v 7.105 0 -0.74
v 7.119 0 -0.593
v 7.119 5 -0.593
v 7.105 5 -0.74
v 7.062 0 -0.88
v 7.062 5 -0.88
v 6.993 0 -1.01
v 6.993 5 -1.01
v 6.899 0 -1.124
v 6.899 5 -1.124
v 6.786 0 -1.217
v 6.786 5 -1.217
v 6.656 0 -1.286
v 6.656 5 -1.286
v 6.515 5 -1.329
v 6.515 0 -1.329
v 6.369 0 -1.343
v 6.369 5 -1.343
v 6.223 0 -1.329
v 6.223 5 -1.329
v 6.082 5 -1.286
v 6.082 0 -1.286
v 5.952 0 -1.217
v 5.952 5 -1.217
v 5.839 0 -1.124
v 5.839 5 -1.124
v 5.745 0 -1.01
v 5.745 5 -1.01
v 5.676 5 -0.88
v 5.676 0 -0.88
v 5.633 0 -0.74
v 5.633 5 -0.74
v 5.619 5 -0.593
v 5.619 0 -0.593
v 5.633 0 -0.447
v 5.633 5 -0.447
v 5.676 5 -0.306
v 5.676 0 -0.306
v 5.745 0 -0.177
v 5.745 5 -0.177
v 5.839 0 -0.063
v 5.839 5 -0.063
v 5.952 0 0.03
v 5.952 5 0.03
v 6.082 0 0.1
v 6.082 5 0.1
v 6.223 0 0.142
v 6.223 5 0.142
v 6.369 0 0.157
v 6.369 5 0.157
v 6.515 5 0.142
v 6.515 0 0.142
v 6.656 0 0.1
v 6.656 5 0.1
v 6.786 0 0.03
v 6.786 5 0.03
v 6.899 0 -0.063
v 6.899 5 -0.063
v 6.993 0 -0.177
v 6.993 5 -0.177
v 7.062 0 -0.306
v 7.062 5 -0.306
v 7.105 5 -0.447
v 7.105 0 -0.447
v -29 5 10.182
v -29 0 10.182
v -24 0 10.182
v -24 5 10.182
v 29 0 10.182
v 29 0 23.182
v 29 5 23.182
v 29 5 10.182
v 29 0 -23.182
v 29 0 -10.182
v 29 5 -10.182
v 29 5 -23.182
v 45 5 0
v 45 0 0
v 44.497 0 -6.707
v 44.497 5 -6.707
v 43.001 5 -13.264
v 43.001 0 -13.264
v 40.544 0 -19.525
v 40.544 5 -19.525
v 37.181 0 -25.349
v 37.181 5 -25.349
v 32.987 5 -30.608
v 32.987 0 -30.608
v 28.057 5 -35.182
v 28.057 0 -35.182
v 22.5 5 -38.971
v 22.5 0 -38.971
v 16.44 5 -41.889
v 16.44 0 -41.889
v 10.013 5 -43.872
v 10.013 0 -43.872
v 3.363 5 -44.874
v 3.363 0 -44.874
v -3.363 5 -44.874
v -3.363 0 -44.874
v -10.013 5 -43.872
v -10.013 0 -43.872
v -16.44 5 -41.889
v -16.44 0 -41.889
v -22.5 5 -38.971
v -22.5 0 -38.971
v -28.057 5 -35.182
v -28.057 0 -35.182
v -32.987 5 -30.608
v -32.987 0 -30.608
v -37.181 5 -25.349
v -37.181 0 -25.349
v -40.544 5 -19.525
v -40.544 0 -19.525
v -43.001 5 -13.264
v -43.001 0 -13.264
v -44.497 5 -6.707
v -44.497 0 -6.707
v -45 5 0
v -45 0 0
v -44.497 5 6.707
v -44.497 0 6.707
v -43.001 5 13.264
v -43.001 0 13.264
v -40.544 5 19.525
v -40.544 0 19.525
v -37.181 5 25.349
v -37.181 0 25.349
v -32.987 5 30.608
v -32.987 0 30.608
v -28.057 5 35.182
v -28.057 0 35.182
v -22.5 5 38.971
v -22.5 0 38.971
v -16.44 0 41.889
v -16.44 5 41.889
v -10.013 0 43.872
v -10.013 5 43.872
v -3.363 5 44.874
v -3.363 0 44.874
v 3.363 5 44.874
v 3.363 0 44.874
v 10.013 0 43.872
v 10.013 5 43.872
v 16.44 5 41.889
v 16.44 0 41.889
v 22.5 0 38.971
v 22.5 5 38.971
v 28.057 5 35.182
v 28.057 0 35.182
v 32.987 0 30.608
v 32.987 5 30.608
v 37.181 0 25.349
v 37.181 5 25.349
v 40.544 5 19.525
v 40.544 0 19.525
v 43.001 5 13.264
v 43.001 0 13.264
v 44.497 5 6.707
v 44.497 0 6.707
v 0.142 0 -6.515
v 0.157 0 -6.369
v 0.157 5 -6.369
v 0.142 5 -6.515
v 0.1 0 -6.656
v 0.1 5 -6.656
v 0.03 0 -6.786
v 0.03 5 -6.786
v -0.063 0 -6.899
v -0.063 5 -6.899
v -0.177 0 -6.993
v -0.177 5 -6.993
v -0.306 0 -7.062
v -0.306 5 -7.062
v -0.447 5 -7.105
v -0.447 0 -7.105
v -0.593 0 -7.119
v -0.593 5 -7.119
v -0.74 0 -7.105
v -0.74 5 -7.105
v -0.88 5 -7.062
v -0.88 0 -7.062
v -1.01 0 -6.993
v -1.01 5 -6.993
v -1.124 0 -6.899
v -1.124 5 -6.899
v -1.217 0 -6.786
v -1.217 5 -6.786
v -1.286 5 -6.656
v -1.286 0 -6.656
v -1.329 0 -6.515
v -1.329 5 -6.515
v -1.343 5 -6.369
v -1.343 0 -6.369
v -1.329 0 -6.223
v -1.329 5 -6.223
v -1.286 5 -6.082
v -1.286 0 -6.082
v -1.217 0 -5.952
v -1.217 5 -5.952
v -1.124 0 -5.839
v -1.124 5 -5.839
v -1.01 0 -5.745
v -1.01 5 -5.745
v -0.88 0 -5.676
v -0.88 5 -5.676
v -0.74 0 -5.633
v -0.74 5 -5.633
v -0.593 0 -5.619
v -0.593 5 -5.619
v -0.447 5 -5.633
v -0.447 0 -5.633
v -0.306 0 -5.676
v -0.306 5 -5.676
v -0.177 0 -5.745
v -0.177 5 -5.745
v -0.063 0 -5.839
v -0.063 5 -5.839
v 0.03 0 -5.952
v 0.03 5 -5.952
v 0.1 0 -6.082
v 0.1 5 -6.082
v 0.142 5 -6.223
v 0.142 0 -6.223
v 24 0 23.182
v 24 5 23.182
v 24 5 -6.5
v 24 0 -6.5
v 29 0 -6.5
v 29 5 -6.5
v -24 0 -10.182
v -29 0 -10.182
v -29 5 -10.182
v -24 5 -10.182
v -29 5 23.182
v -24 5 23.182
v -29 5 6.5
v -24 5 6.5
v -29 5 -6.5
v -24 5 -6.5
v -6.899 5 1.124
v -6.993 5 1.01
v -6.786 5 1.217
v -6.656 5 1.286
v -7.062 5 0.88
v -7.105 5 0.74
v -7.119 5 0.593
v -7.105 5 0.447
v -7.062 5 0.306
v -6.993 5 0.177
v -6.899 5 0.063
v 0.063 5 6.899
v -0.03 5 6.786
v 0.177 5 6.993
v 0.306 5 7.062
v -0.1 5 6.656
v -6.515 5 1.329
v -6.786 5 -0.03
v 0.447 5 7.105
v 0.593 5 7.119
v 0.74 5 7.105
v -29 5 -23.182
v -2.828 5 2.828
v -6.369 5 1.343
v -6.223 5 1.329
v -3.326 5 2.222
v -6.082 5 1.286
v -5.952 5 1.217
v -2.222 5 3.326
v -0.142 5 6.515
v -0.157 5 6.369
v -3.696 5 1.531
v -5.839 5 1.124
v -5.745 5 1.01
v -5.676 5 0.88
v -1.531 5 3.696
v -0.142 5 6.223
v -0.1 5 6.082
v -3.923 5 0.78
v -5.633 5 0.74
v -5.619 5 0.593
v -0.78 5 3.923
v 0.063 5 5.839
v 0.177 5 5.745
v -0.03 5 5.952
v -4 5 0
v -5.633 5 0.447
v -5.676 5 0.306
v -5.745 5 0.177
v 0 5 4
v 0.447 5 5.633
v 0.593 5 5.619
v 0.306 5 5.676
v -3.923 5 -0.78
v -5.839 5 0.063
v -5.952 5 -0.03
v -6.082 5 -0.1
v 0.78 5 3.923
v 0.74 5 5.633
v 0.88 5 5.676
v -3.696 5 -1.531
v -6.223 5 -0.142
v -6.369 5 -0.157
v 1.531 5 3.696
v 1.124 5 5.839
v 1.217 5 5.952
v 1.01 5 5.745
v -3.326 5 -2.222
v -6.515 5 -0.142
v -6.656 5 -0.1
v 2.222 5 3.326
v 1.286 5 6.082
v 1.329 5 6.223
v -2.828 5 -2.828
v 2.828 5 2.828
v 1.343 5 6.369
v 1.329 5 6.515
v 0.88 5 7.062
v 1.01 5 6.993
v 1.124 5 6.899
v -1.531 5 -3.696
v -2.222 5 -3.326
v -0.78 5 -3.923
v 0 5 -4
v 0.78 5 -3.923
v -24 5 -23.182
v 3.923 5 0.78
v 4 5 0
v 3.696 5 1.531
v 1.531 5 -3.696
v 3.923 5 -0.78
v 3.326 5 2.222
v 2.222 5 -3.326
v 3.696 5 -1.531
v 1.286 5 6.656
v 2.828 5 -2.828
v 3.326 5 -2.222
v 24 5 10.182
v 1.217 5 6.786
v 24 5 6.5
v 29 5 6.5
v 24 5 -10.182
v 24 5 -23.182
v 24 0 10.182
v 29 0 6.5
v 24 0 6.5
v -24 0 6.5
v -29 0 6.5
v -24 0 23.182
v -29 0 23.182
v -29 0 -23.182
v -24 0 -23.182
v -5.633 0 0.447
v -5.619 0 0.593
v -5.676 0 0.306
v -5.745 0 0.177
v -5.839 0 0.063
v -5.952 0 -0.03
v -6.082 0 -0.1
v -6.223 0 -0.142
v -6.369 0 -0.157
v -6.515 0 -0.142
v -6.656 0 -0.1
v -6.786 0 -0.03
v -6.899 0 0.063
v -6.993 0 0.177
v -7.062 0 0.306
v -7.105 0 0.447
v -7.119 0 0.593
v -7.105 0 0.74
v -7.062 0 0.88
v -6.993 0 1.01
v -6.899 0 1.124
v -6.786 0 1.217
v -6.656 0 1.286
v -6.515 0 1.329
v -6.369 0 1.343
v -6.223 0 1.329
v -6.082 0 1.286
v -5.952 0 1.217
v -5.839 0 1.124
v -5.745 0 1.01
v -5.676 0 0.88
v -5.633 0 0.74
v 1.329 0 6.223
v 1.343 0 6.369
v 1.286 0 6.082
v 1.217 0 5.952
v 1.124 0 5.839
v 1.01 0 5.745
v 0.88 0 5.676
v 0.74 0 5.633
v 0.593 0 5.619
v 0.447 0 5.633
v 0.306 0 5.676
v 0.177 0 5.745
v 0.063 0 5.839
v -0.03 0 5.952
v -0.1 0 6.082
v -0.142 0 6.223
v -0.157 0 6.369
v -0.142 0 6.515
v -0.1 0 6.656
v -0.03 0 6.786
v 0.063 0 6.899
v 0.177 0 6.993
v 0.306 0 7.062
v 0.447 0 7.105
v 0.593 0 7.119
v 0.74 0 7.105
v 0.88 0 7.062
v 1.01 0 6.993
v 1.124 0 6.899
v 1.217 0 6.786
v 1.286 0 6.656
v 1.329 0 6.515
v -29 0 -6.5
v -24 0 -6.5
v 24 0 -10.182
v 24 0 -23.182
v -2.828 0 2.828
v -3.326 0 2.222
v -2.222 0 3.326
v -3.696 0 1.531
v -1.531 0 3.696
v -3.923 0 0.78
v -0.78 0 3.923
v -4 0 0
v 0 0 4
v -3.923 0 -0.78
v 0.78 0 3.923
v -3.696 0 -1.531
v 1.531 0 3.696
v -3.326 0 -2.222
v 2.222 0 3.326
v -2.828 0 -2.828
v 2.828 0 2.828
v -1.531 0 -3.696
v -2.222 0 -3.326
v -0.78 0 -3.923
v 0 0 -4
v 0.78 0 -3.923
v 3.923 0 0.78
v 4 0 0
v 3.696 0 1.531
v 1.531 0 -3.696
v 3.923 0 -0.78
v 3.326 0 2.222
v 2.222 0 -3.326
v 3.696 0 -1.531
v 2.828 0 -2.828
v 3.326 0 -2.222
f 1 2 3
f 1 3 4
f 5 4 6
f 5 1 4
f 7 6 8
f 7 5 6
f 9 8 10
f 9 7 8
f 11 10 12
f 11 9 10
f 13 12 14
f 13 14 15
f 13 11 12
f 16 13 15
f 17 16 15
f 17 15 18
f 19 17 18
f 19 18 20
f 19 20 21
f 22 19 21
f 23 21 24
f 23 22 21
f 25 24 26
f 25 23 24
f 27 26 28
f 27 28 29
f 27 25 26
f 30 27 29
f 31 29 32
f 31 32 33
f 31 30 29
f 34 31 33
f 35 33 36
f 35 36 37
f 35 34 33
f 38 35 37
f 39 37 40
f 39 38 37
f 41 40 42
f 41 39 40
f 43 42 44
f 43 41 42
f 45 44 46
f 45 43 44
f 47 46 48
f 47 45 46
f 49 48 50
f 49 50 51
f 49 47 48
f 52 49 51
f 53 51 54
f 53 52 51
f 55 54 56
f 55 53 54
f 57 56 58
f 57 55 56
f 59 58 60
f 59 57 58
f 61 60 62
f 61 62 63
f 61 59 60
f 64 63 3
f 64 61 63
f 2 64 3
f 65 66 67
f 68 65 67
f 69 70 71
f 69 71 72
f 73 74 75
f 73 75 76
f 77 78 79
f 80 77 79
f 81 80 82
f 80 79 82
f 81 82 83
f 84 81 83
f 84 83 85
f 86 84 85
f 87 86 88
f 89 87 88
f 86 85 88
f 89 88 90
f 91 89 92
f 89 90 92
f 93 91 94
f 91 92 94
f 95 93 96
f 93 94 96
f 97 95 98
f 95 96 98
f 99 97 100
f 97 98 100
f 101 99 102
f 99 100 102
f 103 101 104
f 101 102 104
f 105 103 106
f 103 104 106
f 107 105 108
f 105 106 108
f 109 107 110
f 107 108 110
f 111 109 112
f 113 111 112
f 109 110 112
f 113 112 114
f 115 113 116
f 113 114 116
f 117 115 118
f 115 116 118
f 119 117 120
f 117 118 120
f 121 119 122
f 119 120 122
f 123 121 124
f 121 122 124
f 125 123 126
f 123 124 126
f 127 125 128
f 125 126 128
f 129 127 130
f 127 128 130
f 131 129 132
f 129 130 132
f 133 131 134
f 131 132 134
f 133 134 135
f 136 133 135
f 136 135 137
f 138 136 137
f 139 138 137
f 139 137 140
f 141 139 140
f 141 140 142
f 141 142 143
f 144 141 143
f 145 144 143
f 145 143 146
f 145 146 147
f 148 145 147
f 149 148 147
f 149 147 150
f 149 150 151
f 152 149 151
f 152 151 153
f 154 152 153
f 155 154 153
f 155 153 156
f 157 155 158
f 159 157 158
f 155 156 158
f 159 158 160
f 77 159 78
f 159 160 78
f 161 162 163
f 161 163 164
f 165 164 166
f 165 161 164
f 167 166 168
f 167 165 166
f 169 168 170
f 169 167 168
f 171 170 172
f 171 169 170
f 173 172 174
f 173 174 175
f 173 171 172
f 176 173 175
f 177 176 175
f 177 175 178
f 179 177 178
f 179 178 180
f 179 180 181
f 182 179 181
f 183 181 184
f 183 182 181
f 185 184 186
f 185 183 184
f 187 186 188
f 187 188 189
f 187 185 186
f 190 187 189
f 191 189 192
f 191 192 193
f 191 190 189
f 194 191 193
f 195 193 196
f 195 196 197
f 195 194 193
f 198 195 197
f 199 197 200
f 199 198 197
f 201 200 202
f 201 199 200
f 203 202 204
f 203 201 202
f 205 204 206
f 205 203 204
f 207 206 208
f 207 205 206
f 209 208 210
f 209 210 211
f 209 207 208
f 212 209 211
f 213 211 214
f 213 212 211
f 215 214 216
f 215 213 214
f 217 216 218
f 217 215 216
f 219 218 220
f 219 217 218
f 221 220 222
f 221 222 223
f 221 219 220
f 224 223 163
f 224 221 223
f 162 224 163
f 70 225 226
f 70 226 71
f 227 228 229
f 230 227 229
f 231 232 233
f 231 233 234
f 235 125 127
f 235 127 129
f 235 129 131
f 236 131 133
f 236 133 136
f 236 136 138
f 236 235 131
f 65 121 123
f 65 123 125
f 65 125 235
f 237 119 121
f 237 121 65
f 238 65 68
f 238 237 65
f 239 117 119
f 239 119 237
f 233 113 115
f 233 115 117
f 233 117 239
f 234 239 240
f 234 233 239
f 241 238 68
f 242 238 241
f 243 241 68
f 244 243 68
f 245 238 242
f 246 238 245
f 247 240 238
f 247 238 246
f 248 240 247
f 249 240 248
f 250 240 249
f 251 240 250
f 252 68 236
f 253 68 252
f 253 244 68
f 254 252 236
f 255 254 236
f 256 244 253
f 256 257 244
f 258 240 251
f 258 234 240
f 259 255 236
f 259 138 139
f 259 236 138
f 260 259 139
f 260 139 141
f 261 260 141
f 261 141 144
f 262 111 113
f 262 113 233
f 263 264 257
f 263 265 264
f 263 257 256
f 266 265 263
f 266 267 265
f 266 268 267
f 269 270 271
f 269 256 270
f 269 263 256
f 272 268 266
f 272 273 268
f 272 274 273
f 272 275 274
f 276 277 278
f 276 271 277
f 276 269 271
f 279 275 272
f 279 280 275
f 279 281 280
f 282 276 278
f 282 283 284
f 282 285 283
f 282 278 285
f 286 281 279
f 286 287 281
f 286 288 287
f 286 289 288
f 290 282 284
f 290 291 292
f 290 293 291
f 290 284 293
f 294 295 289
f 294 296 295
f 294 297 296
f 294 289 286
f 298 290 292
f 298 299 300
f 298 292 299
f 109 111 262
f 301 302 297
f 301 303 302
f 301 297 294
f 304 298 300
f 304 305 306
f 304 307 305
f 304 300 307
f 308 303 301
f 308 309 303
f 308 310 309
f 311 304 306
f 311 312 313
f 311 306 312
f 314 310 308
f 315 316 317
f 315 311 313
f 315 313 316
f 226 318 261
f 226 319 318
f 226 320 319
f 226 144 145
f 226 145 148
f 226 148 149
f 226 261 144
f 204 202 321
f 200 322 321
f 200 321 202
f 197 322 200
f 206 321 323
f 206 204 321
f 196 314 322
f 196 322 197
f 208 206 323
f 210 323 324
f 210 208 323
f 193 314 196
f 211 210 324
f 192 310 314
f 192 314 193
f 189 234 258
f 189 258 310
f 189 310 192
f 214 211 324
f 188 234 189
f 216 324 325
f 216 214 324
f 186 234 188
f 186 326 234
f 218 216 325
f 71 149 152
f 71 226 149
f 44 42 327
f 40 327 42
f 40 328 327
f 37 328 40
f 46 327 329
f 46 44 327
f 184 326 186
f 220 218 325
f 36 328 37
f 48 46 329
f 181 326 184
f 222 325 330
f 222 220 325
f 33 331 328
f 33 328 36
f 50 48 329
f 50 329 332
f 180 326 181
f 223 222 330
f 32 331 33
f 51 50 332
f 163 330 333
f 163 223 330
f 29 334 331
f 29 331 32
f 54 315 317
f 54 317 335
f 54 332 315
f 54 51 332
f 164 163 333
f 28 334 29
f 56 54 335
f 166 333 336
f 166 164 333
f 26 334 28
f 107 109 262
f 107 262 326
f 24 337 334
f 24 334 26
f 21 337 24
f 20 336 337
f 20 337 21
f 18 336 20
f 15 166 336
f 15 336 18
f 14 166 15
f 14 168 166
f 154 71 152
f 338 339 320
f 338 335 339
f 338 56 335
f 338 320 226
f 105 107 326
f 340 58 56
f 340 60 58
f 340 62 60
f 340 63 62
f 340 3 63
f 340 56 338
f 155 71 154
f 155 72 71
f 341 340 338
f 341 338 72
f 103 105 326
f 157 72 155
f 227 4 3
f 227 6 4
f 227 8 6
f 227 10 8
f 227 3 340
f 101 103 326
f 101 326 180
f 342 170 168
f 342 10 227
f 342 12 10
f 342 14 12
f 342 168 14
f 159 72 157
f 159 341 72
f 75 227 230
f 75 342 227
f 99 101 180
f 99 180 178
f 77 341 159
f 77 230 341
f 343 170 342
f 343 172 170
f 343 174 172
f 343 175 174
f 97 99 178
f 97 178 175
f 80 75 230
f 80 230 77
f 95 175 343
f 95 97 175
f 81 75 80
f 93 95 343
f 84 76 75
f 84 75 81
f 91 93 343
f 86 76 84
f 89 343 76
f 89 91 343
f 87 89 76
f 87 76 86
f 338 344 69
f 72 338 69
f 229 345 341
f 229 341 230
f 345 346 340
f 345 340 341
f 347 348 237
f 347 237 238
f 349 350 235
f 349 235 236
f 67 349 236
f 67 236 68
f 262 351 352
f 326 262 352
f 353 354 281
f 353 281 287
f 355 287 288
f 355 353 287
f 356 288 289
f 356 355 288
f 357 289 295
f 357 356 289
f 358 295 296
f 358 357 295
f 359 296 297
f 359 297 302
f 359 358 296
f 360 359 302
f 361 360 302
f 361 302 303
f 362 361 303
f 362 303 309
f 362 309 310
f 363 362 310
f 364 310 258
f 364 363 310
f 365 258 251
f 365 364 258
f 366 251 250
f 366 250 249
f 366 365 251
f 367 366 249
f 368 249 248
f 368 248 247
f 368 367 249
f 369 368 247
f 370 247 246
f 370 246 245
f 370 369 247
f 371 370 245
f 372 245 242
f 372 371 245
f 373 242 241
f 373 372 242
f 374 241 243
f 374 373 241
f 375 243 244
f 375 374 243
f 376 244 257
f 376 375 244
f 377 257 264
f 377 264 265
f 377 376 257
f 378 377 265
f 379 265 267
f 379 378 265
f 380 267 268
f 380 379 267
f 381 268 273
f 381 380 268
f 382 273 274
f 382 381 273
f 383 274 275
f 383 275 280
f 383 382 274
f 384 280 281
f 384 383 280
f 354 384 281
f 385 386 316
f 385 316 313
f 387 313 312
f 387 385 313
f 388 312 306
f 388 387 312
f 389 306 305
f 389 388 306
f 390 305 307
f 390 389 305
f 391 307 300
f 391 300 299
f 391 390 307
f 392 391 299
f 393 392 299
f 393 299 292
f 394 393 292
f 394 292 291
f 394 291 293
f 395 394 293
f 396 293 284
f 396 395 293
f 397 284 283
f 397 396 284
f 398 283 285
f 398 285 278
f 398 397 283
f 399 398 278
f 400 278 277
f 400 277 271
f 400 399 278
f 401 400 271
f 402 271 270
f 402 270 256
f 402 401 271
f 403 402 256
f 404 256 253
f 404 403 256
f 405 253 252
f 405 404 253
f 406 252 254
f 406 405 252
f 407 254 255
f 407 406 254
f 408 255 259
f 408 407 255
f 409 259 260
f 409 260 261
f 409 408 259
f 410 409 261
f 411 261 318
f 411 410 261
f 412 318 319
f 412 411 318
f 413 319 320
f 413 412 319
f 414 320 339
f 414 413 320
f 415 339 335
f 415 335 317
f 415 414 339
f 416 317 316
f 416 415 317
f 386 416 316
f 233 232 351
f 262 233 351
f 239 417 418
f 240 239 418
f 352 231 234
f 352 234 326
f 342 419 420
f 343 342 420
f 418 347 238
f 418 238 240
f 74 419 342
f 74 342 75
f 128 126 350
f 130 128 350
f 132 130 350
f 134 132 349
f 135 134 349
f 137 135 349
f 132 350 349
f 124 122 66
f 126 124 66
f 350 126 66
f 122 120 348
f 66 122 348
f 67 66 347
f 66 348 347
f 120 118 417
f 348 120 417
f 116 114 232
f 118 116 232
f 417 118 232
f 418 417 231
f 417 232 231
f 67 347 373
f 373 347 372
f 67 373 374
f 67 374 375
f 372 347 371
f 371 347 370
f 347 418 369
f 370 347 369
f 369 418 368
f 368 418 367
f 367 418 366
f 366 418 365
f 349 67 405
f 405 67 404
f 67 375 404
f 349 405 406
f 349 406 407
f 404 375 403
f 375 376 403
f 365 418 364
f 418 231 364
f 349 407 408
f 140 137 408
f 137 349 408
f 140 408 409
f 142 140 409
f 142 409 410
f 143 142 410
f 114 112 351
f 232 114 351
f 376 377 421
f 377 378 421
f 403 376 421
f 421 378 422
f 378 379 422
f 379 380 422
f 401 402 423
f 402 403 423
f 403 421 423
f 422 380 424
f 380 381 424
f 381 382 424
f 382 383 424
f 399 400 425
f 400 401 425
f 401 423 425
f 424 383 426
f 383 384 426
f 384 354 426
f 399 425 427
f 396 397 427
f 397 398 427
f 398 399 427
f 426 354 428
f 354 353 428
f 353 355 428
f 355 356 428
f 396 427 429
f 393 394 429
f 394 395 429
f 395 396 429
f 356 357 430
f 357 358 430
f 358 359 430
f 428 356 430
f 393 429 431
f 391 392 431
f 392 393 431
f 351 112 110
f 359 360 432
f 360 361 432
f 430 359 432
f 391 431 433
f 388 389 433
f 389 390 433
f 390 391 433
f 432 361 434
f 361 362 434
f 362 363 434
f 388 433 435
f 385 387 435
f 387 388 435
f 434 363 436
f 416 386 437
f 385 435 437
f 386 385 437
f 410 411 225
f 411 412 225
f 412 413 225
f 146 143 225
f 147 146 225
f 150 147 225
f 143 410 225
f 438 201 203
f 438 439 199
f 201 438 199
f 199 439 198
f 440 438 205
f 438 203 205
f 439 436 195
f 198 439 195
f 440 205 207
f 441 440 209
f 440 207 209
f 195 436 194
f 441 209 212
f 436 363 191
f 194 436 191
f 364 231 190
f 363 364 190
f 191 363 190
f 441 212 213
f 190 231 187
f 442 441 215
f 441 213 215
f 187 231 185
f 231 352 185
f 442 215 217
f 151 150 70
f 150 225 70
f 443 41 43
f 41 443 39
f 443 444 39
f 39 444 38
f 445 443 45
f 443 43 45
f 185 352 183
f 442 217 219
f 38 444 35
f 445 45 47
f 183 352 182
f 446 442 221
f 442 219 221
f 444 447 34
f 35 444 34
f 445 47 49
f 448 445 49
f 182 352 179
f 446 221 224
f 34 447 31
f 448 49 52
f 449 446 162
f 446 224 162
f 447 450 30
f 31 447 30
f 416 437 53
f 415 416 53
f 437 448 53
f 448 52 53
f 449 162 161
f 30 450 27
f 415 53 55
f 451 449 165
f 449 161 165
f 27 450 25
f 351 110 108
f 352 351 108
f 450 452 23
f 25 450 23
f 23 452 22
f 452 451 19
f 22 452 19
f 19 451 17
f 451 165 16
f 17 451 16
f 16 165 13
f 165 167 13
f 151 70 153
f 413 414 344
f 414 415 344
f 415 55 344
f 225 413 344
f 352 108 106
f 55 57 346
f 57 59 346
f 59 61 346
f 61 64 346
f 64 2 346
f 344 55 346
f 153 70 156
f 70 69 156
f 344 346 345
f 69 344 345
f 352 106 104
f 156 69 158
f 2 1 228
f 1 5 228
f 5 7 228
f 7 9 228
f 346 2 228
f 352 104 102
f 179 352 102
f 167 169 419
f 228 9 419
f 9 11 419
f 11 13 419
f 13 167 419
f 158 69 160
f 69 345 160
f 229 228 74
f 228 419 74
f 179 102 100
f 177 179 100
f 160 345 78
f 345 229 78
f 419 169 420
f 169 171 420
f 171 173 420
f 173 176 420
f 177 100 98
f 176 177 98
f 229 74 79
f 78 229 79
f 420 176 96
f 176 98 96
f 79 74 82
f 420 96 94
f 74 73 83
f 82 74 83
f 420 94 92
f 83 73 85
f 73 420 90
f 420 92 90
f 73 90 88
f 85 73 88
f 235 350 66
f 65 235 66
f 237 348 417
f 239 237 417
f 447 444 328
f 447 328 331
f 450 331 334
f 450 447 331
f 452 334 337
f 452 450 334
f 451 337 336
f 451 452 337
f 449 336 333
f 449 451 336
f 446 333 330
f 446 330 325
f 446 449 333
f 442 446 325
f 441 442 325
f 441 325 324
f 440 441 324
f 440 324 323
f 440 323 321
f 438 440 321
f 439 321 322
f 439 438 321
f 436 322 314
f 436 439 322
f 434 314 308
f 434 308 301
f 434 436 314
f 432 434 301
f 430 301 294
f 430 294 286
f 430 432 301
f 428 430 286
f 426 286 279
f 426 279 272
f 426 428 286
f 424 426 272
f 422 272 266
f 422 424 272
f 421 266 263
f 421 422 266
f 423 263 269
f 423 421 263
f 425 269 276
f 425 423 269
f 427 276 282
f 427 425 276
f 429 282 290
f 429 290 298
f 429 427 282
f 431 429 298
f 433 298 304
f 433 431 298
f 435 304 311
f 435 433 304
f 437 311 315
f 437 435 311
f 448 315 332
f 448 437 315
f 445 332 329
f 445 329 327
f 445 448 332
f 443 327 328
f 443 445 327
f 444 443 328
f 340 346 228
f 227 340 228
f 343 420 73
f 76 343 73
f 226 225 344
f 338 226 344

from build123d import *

# Parameters (mm, degrees)
SKETCH1_R           = 45
SKETCH1_R_2         = 4
SKETCH1_R_3         = 0.75
SKETCH1_W           = 5
SKETCH1_H           = 13
BOSS_EXTRUDE1_DEPTH = 5


with BuildPart() as part:
    # Sketch1 → Boss-Extrude1 (new body)
    with BuildSketch(Plane(origin=(0, 0, 0), x_dir=(1, 0, 0), z_dir=(0, 1, 0))):
        Circle(SKETCH1_R)
        Circle(SKETCH1_R_2, mode=Mode.SUBTRACT)
        with Locations((6.368925704, 0.593189593)):
            Circle(SKETCH1_R_3, mode=Mode.SUBTRACT)
        with Locations((0.593189593, -6.368925704)):
            Circle(SKETCH1_R_3, mode=Mode.SUBTRACT)
        with Locations((-0.593189593, 6.368925704)):
            Circle(SKETCH1_R_3, mode=Mode.SUBTRACT)
        with Locations((-6.368925704, -0.593189593)):
            Circle(SKETCH1_R_3, mode=Mode.SUBTRACT)
        with Locations((26.5, -16.682134432)):
            Rectangle(SKETCH1_W, SKETCH1_H, mode=Mode.SUBTRACT)
        with Locations((26.5, 16.682134432)):
            Rectangle(SKETCH1_W, SKETCH1_H, mode=Mode.SUBTRACT)
        with Locations((-26.5, -16.682134432)):
            Rectangle(SKETCH1_W, SKETCH1_H, mode=Mode.SUBTRACT)
        with Locations((26.5, 0)):
            Rectangle(SKETCH1_W, SKETCH1_H, mode=Mode.SUBTRACT)
        with Locations((-26.5, 0)):
            Rectangle(SKETCH1_W, SKETCH1_H, mode=Mode.SUBTRACT)
        with Locations((-26.5, 16.682134432)):
            Rectangle(SKETCH1_W, SKETCH1_H, mode=Mode.SUBTRACT)
    extrude(amount=BOSS_EXTRUDE1_DEPTH)


solid = part.part
